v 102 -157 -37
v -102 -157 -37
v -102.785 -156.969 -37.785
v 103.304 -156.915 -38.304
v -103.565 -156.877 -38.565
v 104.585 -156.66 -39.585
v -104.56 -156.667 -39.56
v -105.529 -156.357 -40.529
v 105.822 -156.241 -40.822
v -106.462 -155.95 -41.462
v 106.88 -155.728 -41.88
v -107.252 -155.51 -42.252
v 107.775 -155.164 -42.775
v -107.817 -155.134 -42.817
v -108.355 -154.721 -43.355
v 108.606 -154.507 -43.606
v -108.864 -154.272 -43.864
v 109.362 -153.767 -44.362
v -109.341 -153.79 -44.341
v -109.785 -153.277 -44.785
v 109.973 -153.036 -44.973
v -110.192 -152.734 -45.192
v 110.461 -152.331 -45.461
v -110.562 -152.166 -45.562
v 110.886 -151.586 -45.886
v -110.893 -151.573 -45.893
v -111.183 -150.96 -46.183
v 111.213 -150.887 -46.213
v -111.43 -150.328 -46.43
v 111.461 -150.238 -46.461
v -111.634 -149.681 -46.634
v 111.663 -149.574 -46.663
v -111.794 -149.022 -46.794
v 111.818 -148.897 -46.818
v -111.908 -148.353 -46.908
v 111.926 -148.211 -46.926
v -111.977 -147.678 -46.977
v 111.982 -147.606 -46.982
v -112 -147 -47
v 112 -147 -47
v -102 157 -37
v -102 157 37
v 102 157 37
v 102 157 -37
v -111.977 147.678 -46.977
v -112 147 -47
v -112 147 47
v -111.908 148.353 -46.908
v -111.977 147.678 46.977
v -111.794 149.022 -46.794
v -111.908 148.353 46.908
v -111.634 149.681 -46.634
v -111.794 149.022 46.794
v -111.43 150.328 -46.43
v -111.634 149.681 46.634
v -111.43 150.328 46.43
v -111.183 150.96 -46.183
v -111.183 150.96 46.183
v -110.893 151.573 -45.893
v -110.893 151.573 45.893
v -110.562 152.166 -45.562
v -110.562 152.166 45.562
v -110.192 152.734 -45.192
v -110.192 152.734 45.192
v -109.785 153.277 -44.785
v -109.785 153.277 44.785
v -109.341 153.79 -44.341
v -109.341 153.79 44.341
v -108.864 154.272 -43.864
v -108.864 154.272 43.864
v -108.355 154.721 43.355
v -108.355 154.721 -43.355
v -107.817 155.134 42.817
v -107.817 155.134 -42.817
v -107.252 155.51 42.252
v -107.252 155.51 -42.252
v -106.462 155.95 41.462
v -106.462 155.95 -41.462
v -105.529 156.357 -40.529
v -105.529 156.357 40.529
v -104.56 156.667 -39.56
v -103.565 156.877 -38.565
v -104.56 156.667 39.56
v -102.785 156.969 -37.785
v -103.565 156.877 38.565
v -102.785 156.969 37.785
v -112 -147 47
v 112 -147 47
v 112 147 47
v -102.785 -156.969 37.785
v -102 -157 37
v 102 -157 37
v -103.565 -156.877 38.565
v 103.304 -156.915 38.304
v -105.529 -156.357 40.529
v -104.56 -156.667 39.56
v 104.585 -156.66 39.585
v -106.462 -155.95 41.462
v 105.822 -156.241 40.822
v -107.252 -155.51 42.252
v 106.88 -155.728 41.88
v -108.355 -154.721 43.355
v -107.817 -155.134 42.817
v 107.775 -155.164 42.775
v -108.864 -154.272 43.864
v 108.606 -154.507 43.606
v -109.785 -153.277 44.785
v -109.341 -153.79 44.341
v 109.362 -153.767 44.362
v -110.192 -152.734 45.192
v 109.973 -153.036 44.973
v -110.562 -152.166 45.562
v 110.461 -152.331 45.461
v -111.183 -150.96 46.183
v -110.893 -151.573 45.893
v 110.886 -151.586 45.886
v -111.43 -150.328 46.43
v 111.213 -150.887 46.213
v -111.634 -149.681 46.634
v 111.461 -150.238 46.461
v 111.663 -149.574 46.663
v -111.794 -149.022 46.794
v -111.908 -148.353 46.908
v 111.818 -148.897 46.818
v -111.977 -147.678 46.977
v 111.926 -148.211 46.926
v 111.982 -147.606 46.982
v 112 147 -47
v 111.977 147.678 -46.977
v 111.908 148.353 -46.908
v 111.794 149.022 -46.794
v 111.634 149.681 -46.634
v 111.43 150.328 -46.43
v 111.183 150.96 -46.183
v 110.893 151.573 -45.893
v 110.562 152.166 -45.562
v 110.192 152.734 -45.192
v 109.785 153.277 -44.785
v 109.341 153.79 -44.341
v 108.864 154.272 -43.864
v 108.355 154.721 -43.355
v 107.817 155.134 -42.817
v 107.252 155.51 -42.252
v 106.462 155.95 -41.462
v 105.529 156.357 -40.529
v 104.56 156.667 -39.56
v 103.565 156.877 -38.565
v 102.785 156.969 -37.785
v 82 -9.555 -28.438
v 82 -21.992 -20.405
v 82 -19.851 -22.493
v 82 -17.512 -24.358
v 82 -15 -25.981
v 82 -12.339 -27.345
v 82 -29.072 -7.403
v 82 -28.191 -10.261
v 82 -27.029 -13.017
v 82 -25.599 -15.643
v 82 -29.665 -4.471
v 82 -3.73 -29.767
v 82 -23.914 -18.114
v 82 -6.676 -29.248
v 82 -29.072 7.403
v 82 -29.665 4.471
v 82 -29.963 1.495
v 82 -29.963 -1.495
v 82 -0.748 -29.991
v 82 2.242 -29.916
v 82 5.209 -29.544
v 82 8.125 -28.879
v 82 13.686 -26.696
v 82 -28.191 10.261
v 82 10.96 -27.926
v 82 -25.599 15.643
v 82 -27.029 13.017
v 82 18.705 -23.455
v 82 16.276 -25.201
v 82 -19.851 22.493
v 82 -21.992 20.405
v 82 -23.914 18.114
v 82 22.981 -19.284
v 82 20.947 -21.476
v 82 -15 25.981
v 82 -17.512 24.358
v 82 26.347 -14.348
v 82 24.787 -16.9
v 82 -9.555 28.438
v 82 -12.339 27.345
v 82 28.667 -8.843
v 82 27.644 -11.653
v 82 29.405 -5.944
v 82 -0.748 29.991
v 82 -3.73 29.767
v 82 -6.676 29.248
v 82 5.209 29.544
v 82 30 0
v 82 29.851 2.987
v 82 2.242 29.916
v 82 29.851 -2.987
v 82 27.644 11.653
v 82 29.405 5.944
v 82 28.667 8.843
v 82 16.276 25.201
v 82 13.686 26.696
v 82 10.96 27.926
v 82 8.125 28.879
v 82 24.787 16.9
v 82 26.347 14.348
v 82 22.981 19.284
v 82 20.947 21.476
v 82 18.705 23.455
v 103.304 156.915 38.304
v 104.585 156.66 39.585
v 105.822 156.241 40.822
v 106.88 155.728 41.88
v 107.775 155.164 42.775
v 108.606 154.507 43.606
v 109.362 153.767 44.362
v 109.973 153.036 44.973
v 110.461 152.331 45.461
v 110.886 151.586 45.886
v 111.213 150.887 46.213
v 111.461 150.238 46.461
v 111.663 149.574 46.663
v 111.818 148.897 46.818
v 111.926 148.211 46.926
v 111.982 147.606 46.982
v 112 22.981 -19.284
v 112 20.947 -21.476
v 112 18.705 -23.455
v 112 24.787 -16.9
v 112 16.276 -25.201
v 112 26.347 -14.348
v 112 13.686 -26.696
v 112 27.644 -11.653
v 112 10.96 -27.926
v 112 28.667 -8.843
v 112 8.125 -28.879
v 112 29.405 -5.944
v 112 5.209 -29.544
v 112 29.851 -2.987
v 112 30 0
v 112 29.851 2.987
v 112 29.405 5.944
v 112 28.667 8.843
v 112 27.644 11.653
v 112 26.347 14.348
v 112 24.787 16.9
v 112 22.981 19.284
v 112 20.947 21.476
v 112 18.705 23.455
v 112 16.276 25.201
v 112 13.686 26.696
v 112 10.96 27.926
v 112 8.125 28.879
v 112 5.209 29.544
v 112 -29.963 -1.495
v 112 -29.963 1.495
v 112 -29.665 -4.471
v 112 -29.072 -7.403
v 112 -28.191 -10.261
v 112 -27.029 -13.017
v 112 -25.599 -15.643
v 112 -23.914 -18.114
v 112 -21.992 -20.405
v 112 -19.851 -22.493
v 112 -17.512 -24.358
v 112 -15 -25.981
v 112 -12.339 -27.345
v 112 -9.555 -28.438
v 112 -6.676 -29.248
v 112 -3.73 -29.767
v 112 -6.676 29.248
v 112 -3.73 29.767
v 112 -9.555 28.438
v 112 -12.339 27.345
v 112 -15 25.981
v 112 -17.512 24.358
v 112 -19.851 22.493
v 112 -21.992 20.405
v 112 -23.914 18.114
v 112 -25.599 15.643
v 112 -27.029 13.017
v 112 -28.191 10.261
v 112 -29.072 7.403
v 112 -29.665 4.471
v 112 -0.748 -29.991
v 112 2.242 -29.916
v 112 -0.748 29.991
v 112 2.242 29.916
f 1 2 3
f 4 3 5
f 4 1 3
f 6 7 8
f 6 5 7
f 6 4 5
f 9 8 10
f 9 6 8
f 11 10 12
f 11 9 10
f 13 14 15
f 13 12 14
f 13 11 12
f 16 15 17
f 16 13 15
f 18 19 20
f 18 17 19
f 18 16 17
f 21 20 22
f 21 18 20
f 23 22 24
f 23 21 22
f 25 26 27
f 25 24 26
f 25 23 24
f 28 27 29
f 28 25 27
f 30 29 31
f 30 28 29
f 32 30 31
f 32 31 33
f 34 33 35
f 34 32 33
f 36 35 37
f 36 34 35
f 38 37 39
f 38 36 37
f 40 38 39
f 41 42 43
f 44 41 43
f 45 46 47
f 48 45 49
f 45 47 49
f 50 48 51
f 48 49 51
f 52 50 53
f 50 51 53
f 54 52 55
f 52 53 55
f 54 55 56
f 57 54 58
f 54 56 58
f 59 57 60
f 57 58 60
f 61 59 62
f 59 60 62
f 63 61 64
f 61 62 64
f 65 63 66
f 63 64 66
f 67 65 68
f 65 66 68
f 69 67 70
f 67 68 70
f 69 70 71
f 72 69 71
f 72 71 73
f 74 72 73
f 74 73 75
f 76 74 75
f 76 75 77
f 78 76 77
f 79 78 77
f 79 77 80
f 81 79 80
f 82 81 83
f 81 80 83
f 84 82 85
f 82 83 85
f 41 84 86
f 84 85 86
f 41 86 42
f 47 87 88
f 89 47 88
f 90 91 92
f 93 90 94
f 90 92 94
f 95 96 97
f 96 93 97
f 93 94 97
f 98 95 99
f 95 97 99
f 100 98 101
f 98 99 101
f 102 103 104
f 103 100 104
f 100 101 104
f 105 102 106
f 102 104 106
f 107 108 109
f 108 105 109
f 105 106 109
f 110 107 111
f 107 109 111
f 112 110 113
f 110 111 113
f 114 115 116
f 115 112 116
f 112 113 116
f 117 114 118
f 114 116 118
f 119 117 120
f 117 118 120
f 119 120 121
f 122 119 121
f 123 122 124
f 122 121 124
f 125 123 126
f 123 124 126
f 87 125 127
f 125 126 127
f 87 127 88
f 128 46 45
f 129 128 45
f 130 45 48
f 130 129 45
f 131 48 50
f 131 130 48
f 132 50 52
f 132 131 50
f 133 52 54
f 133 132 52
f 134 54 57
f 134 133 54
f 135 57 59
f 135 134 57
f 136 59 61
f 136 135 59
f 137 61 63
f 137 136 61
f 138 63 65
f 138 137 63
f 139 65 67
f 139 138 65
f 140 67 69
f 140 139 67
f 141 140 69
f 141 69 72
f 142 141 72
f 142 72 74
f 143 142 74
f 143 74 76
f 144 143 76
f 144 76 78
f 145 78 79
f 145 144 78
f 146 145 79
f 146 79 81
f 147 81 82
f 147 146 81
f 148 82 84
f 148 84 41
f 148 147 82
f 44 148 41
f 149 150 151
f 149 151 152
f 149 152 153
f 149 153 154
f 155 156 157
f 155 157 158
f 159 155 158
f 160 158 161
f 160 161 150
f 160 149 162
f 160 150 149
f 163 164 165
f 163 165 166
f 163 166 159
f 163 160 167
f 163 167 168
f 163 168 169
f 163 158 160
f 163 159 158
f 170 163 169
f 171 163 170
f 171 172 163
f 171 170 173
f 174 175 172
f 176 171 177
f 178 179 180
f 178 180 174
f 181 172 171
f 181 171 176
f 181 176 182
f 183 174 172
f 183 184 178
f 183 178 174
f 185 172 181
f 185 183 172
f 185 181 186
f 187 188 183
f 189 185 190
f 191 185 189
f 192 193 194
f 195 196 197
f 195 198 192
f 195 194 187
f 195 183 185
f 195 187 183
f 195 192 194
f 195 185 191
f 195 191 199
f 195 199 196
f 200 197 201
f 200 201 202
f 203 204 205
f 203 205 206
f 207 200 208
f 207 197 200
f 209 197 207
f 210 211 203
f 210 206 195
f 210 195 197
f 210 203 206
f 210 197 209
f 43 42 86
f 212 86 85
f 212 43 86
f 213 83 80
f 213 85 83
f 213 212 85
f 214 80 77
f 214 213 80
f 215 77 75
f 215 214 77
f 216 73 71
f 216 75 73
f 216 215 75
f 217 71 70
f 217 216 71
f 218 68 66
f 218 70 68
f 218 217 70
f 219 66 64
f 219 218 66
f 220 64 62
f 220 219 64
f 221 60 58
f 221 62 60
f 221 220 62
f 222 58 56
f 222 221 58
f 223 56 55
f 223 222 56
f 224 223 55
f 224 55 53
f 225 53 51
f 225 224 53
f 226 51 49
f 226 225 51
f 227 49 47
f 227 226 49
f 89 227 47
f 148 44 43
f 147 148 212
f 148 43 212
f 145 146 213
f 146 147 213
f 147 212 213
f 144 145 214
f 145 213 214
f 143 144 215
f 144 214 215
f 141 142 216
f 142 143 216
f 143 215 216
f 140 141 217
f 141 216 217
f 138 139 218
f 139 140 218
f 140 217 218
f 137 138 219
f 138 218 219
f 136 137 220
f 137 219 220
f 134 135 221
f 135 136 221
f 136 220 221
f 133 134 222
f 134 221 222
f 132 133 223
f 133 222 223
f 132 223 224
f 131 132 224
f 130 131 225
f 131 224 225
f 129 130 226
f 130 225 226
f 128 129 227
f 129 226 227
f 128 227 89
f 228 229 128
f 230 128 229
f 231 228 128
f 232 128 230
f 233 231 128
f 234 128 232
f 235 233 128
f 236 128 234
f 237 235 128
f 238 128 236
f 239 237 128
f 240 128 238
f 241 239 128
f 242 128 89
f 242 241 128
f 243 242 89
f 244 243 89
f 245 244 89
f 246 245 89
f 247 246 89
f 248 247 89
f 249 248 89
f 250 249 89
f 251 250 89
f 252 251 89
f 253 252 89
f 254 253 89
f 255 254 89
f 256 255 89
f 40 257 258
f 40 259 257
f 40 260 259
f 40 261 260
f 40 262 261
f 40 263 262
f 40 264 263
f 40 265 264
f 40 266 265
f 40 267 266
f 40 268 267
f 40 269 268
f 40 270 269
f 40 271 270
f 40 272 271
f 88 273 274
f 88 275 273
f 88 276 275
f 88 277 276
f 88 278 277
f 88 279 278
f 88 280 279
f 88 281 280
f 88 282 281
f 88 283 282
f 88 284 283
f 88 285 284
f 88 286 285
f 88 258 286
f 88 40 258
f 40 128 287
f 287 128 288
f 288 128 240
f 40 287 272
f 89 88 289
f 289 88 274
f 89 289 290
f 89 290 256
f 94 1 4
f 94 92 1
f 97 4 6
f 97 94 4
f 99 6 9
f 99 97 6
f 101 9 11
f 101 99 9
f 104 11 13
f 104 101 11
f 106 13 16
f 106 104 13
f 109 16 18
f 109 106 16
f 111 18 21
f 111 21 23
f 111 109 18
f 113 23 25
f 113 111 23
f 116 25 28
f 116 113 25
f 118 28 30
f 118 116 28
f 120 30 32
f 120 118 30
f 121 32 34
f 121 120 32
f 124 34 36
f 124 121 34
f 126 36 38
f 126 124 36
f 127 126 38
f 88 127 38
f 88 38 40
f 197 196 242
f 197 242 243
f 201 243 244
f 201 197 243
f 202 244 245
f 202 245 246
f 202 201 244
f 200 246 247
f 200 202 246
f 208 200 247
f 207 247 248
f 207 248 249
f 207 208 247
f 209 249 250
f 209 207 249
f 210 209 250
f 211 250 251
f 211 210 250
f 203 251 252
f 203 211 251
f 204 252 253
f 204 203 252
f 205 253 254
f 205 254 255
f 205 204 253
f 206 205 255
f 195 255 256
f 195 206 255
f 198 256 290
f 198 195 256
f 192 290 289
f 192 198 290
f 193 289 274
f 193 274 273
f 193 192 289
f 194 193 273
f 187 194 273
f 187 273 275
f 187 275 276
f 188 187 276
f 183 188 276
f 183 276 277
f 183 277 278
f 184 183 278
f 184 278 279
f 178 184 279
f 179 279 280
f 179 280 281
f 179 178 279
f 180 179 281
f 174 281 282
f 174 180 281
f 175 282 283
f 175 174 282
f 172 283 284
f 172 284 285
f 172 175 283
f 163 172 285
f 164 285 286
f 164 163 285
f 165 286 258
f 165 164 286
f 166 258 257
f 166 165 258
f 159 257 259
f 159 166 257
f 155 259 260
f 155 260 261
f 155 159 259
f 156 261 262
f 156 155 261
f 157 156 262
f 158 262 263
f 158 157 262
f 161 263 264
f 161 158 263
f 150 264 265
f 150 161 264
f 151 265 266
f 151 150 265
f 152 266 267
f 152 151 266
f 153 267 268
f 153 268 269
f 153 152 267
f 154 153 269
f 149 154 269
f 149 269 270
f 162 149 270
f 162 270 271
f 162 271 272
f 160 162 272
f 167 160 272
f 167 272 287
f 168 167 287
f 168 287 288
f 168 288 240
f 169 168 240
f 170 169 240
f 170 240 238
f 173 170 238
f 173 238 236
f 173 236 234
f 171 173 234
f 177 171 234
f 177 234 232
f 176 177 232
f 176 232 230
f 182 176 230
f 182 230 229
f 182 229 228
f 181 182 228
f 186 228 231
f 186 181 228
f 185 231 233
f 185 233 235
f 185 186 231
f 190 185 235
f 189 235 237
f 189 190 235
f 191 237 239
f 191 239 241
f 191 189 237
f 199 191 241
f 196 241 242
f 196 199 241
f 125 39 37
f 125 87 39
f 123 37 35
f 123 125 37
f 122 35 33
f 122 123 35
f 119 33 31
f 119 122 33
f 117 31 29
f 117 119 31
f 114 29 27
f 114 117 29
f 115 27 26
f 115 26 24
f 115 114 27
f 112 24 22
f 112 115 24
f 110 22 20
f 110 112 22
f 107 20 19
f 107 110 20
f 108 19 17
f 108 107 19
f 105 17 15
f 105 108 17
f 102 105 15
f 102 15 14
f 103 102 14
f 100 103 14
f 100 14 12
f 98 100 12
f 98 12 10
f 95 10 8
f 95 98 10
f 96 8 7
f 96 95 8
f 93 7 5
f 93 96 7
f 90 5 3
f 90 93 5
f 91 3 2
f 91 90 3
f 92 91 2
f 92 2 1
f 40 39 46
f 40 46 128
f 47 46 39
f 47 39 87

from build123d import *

# Parameters (mm, degrees)
F0_W     = 224
F0_H     = 94
F1_DEPTH = 157
F2_R     = 10
F3_R     = 10
F5_R     = 30
F6_DEPTH = 30


with BuildPart() as f1:
    # F0 (on Front) → F1 (new body, symmetric)
    with BuildSketch(Plane.XZ):
        Rectangle(F0_W, F0_H)
    extrude(amount=F1_DEPTH, both=True)

    # F2
    f2_edges = [f1.edges().sort_by_distance(p)[0] for p in [
        (-112, -157, 0),
        (0, -157, -47),
        (112, -157, 0),
        (0, -157, 47),
    ]]
    fillet(f2_edges, radius=F2_R)

    # F3
    f3_edges = [f1.edges().sort_by_distance(p)[0] for p in [
        (-112, 157, 0),
        (0, 157, -47),
        (112, 157, 0),
        (0, 157, 47),
    ]]
    fillet(f3_edges, radius=F3_R)

    # F5 (on offset) → F6 (cut)
    with BuildSketch(Plane.YZ.offset(82)):
        Circle(F5_R)
    extrude(amount=F6_DEPTH, mode=Mode.SUBTRACT)


solid = f1.part
